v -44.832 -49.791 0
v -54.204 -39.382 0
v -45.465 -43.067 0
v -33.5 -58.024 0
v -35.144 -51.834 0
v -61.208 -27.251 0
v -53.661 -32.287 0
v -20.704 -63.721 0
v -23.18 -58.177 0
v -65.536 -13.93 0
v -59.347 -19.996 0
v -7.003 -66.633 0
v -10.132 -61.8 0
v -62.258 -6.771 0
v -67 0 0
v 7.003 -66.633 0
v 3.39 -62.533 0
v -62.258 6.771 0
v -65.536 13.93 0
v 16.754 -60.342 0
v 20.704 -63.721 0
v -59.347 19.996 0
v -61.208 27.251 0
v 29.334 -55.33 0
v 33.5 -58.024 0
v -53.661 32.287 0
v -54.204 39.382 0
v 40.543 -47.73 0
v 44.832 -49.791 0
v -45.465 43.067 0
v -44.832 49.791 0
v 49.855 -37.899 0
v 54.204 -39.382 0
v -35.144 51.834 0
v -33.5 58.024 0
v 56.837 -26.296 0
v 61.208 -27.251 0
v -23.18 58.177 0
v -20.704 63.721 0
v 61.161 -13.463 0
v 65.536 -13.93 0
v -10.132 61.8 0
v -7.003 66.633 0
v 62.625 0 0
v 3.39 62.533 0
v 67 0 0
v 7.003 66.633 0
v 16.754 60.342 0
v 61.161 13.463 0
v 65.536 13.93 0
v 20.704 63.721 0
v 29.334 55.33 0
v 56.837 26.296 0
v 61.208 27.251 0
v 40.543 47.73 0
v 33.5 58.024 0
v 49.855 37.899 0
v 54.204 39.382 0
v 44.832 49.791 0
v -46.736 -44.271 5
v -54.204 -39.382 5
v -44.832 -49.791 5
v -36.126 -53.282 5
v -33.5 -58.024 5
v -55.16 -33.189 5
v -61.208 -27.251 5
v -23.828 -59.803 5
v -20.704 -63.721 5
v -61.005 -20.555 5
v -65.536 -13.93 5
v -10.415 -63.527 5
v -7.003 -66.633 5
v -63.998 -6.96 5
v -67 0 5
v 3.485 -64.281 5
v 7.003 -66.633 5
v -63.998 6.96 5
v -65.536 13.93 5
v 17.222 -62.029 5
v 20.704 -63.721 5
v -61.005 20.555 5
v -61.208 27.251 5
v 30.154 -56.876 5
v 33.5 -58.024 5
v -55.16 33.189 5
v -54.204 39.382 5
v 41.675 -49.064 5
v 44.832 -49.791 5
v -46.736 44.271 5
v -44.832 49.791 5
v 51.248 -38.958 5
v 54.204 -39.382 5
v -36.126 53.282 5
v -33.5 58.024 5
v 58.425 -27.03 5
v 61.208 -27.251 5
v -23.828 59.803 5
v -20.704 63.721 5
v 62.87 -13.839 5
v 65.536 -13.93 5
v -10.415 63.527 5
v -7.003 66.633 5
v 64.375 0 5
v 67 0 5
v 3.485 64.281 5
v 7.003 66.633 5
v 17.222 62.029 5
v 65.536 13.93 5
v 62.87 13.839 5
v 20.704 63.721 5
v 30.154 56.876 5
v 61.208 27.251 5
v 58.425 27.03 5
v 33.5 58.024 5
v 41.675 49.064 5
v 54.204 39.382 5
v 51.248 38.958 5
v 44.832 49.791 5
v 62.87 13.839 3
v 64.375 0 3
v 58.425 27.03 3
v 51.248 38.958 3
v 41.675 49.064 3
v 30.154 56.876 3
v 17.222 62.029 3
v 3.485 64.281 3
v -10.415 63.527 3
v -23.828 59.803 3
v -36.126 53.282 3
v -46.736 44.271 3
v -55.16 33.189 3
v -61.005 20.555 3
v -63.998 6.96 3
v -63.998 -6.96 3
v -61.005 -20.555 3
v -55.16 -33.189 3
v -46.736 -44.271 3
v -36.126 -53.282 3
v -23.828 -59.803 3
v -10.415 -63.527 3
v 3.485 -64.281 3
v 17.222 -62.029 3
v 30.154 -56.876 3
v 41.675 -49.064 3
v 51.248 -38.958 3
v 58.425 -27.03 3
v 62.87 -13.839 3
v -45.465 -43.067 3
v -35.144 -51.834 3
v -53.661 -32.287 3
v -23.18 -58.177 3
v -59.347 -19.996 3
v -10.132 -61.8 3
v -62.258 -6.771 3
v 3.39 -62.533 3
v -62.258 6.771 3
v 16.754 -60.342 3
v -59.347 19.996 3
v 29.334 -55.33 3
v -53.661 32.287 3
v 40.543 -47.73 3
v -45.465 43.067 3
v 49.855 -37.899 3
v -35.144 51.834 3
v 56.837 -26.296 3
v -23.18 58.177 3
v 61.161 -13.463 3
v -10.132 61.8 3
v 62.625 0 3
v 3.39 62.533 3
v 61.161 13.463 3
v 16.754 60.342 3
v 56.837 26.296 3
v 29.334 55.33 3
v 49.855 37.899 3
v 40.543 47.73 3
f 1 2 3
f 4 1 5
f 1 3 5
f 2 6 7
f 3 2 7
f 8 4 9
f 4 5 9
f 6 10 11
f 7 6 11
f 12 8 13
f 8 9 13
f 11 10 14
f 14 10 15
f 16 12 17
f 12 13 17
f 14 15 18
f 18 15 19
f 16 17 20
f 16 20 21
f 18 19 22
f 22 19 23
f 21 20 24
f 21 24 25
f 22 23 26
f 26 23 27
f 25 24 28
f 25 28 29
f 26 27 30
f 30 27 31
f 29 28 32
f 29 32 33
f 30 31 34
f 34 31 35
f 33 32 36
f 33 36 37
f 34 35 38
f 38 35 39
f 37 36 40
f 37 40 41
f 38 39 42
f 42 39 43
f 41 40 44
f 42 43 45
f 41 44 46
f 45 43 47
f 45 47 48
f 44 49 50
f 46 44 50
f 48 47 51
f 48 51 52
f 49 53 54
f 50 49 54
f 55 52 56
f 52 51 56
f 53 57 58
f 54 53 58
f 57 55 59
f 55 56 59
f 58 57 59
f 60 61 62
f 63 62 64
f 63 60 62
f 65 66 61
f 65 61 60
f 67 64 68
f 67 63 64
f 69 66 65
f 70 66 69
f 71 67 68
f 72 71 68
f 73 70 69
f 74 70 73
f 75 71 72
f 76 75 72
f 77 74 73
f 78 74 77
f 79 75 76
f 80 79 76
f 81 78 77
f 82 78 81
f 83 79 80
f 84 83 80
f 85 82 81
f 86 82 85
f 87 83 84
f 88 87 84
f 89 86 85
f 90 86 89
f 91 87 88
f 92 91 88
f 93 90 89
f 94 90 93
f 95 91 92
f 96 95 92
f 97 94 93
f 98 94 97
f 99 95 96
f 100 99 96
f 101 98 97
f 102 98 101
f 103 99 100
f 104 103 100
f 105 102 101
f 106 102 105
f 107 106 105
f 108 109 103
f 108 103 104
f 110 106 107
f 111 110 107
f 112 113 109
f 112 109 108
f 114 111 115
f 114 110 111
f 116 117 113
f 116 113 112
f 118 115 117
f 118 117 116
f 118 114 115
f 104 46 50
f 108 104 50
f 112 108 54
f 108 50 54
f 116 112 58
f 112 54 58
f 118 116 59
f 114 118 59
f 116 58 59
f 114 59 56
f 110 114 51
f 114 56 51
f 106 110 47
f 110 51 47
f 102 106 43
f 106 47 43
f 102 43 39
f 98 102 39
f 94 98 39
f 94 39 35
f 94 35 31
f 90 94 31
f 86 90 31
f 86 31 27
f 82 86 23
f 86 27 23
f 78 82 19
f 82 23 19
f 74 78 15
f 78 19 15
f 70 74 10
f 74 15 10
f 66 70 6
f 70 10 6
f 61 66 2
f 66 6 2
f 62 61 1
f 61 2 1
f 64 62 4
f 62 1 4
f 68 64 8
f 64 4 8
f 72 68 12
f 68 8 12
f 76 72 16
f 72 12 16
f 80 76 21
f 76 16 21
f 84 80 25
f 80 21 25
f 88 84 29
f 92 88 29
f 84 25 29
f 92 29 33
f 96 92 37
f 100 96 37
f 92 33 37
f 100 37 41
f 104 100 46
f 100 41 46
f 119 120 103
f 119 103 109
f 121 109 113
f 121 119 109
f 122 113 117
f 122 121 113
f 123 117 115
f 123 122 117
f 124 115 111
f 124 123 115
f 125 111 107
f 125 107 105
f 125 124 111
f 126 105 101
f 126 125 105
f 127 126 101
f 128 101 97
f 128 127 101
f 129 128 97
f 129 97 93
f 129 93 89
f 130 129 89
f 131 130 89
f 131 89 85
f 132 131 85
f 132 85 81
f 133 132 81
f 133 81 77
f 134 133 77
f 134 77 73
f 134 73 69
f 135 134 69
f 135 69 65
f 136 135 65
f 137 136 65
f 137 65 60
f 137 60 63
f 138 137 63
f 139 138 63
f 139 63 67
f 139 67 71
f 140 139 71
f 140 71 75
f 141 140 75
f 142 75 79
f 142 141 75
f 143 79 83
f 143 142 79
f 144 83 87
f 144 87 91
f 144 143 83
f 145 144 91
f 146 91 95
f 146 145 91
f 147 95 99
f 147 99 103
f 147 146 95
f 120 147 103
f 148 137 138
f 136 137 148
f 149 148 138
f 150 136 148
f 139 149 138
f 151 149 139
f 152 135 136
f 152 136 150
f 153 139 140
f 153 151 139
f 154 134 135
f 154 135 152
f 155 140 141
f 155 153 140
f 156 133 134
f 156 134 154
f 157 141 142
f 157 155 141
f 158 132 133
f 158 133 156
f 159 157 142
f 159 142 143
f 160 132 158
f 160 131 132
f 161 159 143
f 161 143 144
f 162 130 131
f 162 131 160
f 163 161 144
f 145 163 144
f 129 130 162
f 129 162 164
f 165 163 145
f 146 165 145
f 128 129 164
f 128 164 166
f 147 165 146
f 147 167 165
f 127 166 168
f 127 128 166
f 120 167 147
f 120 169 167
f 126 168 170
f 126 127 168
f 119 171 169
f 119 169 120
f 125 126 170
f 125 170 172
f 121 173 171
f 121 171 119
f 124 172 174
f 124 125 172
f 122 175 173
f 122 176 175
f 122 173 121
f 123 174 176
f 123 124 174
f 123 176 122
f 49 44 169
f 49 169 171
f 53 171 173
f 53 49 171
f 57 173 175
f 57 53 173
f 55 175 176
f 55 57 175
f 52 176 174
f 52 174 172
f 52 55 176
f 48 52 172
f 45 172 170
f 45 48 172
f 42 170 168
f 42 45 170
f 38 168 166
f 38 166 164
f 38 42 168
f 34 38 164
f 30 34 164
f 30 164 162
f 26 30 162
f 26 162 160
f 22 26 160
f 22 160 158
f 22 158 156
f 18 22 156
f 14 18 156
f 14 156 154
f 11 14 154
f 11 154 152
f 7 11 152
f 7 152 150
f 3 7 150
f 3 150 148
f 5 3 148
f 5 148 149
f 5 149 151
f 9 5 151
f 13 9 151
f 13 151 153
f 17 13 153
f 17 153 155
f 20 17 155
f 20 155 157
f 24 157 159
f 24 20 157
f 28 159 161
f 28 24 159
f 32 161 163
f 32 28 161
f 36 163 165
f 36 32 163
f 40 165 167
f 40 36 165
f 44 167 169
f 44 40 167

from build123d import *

# Parameters (mm, degrees)
F0_R     = 67
F0_R_2   = 64.375
F1_DEPTH = 5
F0_R_3   = 62.625
F2_DEPTH = 3
F0_R_4   = 58.875
F3_DEPTH = 2
F4_R     = 5.75
F5_DEPTH = 192


# Not quite as in the source:
# - an extrude ends at something that could not be found from the text; its depth is read off the source's solid


with BuildPart() as f1:
    # F0 (on Top) → F1 (new body)
    with BuildSketch(Plane.XY):
        Circle(F0_R)
        Circle(F0_R_2, mode=Mode.SUBTRACT)
    extrude(amount=F1_DEPTH)

    # F0 (on Top) → F2 (join)
    with BuildSketch(Plane.XY):
        Circle(F0_R_2)
        Circle(F0_R_3, mode=Mode.SUBTRACT)
    extrude(amount=F2_DEPTH)

    # F0 (on Top) → F3 (cut)
    with BuildSketch(Plane.XY):
        Circle(F0_R_3)
        Circle(F0_R_4, mode=Mode.SUBTRACT)
    extrude(amount=F3_DEPTH, mode=Mode.SUBTRACT)

    # F4 (on Top) → F5 (cut, through all)
    with BuildSketch(Plane.XY):
        with Locations((0, 46.25)):
            Circle(F4_R)
    extrude(amount=-F5_DEPTH, mode=Mode.SUBTRACT)


solid = f1.part
